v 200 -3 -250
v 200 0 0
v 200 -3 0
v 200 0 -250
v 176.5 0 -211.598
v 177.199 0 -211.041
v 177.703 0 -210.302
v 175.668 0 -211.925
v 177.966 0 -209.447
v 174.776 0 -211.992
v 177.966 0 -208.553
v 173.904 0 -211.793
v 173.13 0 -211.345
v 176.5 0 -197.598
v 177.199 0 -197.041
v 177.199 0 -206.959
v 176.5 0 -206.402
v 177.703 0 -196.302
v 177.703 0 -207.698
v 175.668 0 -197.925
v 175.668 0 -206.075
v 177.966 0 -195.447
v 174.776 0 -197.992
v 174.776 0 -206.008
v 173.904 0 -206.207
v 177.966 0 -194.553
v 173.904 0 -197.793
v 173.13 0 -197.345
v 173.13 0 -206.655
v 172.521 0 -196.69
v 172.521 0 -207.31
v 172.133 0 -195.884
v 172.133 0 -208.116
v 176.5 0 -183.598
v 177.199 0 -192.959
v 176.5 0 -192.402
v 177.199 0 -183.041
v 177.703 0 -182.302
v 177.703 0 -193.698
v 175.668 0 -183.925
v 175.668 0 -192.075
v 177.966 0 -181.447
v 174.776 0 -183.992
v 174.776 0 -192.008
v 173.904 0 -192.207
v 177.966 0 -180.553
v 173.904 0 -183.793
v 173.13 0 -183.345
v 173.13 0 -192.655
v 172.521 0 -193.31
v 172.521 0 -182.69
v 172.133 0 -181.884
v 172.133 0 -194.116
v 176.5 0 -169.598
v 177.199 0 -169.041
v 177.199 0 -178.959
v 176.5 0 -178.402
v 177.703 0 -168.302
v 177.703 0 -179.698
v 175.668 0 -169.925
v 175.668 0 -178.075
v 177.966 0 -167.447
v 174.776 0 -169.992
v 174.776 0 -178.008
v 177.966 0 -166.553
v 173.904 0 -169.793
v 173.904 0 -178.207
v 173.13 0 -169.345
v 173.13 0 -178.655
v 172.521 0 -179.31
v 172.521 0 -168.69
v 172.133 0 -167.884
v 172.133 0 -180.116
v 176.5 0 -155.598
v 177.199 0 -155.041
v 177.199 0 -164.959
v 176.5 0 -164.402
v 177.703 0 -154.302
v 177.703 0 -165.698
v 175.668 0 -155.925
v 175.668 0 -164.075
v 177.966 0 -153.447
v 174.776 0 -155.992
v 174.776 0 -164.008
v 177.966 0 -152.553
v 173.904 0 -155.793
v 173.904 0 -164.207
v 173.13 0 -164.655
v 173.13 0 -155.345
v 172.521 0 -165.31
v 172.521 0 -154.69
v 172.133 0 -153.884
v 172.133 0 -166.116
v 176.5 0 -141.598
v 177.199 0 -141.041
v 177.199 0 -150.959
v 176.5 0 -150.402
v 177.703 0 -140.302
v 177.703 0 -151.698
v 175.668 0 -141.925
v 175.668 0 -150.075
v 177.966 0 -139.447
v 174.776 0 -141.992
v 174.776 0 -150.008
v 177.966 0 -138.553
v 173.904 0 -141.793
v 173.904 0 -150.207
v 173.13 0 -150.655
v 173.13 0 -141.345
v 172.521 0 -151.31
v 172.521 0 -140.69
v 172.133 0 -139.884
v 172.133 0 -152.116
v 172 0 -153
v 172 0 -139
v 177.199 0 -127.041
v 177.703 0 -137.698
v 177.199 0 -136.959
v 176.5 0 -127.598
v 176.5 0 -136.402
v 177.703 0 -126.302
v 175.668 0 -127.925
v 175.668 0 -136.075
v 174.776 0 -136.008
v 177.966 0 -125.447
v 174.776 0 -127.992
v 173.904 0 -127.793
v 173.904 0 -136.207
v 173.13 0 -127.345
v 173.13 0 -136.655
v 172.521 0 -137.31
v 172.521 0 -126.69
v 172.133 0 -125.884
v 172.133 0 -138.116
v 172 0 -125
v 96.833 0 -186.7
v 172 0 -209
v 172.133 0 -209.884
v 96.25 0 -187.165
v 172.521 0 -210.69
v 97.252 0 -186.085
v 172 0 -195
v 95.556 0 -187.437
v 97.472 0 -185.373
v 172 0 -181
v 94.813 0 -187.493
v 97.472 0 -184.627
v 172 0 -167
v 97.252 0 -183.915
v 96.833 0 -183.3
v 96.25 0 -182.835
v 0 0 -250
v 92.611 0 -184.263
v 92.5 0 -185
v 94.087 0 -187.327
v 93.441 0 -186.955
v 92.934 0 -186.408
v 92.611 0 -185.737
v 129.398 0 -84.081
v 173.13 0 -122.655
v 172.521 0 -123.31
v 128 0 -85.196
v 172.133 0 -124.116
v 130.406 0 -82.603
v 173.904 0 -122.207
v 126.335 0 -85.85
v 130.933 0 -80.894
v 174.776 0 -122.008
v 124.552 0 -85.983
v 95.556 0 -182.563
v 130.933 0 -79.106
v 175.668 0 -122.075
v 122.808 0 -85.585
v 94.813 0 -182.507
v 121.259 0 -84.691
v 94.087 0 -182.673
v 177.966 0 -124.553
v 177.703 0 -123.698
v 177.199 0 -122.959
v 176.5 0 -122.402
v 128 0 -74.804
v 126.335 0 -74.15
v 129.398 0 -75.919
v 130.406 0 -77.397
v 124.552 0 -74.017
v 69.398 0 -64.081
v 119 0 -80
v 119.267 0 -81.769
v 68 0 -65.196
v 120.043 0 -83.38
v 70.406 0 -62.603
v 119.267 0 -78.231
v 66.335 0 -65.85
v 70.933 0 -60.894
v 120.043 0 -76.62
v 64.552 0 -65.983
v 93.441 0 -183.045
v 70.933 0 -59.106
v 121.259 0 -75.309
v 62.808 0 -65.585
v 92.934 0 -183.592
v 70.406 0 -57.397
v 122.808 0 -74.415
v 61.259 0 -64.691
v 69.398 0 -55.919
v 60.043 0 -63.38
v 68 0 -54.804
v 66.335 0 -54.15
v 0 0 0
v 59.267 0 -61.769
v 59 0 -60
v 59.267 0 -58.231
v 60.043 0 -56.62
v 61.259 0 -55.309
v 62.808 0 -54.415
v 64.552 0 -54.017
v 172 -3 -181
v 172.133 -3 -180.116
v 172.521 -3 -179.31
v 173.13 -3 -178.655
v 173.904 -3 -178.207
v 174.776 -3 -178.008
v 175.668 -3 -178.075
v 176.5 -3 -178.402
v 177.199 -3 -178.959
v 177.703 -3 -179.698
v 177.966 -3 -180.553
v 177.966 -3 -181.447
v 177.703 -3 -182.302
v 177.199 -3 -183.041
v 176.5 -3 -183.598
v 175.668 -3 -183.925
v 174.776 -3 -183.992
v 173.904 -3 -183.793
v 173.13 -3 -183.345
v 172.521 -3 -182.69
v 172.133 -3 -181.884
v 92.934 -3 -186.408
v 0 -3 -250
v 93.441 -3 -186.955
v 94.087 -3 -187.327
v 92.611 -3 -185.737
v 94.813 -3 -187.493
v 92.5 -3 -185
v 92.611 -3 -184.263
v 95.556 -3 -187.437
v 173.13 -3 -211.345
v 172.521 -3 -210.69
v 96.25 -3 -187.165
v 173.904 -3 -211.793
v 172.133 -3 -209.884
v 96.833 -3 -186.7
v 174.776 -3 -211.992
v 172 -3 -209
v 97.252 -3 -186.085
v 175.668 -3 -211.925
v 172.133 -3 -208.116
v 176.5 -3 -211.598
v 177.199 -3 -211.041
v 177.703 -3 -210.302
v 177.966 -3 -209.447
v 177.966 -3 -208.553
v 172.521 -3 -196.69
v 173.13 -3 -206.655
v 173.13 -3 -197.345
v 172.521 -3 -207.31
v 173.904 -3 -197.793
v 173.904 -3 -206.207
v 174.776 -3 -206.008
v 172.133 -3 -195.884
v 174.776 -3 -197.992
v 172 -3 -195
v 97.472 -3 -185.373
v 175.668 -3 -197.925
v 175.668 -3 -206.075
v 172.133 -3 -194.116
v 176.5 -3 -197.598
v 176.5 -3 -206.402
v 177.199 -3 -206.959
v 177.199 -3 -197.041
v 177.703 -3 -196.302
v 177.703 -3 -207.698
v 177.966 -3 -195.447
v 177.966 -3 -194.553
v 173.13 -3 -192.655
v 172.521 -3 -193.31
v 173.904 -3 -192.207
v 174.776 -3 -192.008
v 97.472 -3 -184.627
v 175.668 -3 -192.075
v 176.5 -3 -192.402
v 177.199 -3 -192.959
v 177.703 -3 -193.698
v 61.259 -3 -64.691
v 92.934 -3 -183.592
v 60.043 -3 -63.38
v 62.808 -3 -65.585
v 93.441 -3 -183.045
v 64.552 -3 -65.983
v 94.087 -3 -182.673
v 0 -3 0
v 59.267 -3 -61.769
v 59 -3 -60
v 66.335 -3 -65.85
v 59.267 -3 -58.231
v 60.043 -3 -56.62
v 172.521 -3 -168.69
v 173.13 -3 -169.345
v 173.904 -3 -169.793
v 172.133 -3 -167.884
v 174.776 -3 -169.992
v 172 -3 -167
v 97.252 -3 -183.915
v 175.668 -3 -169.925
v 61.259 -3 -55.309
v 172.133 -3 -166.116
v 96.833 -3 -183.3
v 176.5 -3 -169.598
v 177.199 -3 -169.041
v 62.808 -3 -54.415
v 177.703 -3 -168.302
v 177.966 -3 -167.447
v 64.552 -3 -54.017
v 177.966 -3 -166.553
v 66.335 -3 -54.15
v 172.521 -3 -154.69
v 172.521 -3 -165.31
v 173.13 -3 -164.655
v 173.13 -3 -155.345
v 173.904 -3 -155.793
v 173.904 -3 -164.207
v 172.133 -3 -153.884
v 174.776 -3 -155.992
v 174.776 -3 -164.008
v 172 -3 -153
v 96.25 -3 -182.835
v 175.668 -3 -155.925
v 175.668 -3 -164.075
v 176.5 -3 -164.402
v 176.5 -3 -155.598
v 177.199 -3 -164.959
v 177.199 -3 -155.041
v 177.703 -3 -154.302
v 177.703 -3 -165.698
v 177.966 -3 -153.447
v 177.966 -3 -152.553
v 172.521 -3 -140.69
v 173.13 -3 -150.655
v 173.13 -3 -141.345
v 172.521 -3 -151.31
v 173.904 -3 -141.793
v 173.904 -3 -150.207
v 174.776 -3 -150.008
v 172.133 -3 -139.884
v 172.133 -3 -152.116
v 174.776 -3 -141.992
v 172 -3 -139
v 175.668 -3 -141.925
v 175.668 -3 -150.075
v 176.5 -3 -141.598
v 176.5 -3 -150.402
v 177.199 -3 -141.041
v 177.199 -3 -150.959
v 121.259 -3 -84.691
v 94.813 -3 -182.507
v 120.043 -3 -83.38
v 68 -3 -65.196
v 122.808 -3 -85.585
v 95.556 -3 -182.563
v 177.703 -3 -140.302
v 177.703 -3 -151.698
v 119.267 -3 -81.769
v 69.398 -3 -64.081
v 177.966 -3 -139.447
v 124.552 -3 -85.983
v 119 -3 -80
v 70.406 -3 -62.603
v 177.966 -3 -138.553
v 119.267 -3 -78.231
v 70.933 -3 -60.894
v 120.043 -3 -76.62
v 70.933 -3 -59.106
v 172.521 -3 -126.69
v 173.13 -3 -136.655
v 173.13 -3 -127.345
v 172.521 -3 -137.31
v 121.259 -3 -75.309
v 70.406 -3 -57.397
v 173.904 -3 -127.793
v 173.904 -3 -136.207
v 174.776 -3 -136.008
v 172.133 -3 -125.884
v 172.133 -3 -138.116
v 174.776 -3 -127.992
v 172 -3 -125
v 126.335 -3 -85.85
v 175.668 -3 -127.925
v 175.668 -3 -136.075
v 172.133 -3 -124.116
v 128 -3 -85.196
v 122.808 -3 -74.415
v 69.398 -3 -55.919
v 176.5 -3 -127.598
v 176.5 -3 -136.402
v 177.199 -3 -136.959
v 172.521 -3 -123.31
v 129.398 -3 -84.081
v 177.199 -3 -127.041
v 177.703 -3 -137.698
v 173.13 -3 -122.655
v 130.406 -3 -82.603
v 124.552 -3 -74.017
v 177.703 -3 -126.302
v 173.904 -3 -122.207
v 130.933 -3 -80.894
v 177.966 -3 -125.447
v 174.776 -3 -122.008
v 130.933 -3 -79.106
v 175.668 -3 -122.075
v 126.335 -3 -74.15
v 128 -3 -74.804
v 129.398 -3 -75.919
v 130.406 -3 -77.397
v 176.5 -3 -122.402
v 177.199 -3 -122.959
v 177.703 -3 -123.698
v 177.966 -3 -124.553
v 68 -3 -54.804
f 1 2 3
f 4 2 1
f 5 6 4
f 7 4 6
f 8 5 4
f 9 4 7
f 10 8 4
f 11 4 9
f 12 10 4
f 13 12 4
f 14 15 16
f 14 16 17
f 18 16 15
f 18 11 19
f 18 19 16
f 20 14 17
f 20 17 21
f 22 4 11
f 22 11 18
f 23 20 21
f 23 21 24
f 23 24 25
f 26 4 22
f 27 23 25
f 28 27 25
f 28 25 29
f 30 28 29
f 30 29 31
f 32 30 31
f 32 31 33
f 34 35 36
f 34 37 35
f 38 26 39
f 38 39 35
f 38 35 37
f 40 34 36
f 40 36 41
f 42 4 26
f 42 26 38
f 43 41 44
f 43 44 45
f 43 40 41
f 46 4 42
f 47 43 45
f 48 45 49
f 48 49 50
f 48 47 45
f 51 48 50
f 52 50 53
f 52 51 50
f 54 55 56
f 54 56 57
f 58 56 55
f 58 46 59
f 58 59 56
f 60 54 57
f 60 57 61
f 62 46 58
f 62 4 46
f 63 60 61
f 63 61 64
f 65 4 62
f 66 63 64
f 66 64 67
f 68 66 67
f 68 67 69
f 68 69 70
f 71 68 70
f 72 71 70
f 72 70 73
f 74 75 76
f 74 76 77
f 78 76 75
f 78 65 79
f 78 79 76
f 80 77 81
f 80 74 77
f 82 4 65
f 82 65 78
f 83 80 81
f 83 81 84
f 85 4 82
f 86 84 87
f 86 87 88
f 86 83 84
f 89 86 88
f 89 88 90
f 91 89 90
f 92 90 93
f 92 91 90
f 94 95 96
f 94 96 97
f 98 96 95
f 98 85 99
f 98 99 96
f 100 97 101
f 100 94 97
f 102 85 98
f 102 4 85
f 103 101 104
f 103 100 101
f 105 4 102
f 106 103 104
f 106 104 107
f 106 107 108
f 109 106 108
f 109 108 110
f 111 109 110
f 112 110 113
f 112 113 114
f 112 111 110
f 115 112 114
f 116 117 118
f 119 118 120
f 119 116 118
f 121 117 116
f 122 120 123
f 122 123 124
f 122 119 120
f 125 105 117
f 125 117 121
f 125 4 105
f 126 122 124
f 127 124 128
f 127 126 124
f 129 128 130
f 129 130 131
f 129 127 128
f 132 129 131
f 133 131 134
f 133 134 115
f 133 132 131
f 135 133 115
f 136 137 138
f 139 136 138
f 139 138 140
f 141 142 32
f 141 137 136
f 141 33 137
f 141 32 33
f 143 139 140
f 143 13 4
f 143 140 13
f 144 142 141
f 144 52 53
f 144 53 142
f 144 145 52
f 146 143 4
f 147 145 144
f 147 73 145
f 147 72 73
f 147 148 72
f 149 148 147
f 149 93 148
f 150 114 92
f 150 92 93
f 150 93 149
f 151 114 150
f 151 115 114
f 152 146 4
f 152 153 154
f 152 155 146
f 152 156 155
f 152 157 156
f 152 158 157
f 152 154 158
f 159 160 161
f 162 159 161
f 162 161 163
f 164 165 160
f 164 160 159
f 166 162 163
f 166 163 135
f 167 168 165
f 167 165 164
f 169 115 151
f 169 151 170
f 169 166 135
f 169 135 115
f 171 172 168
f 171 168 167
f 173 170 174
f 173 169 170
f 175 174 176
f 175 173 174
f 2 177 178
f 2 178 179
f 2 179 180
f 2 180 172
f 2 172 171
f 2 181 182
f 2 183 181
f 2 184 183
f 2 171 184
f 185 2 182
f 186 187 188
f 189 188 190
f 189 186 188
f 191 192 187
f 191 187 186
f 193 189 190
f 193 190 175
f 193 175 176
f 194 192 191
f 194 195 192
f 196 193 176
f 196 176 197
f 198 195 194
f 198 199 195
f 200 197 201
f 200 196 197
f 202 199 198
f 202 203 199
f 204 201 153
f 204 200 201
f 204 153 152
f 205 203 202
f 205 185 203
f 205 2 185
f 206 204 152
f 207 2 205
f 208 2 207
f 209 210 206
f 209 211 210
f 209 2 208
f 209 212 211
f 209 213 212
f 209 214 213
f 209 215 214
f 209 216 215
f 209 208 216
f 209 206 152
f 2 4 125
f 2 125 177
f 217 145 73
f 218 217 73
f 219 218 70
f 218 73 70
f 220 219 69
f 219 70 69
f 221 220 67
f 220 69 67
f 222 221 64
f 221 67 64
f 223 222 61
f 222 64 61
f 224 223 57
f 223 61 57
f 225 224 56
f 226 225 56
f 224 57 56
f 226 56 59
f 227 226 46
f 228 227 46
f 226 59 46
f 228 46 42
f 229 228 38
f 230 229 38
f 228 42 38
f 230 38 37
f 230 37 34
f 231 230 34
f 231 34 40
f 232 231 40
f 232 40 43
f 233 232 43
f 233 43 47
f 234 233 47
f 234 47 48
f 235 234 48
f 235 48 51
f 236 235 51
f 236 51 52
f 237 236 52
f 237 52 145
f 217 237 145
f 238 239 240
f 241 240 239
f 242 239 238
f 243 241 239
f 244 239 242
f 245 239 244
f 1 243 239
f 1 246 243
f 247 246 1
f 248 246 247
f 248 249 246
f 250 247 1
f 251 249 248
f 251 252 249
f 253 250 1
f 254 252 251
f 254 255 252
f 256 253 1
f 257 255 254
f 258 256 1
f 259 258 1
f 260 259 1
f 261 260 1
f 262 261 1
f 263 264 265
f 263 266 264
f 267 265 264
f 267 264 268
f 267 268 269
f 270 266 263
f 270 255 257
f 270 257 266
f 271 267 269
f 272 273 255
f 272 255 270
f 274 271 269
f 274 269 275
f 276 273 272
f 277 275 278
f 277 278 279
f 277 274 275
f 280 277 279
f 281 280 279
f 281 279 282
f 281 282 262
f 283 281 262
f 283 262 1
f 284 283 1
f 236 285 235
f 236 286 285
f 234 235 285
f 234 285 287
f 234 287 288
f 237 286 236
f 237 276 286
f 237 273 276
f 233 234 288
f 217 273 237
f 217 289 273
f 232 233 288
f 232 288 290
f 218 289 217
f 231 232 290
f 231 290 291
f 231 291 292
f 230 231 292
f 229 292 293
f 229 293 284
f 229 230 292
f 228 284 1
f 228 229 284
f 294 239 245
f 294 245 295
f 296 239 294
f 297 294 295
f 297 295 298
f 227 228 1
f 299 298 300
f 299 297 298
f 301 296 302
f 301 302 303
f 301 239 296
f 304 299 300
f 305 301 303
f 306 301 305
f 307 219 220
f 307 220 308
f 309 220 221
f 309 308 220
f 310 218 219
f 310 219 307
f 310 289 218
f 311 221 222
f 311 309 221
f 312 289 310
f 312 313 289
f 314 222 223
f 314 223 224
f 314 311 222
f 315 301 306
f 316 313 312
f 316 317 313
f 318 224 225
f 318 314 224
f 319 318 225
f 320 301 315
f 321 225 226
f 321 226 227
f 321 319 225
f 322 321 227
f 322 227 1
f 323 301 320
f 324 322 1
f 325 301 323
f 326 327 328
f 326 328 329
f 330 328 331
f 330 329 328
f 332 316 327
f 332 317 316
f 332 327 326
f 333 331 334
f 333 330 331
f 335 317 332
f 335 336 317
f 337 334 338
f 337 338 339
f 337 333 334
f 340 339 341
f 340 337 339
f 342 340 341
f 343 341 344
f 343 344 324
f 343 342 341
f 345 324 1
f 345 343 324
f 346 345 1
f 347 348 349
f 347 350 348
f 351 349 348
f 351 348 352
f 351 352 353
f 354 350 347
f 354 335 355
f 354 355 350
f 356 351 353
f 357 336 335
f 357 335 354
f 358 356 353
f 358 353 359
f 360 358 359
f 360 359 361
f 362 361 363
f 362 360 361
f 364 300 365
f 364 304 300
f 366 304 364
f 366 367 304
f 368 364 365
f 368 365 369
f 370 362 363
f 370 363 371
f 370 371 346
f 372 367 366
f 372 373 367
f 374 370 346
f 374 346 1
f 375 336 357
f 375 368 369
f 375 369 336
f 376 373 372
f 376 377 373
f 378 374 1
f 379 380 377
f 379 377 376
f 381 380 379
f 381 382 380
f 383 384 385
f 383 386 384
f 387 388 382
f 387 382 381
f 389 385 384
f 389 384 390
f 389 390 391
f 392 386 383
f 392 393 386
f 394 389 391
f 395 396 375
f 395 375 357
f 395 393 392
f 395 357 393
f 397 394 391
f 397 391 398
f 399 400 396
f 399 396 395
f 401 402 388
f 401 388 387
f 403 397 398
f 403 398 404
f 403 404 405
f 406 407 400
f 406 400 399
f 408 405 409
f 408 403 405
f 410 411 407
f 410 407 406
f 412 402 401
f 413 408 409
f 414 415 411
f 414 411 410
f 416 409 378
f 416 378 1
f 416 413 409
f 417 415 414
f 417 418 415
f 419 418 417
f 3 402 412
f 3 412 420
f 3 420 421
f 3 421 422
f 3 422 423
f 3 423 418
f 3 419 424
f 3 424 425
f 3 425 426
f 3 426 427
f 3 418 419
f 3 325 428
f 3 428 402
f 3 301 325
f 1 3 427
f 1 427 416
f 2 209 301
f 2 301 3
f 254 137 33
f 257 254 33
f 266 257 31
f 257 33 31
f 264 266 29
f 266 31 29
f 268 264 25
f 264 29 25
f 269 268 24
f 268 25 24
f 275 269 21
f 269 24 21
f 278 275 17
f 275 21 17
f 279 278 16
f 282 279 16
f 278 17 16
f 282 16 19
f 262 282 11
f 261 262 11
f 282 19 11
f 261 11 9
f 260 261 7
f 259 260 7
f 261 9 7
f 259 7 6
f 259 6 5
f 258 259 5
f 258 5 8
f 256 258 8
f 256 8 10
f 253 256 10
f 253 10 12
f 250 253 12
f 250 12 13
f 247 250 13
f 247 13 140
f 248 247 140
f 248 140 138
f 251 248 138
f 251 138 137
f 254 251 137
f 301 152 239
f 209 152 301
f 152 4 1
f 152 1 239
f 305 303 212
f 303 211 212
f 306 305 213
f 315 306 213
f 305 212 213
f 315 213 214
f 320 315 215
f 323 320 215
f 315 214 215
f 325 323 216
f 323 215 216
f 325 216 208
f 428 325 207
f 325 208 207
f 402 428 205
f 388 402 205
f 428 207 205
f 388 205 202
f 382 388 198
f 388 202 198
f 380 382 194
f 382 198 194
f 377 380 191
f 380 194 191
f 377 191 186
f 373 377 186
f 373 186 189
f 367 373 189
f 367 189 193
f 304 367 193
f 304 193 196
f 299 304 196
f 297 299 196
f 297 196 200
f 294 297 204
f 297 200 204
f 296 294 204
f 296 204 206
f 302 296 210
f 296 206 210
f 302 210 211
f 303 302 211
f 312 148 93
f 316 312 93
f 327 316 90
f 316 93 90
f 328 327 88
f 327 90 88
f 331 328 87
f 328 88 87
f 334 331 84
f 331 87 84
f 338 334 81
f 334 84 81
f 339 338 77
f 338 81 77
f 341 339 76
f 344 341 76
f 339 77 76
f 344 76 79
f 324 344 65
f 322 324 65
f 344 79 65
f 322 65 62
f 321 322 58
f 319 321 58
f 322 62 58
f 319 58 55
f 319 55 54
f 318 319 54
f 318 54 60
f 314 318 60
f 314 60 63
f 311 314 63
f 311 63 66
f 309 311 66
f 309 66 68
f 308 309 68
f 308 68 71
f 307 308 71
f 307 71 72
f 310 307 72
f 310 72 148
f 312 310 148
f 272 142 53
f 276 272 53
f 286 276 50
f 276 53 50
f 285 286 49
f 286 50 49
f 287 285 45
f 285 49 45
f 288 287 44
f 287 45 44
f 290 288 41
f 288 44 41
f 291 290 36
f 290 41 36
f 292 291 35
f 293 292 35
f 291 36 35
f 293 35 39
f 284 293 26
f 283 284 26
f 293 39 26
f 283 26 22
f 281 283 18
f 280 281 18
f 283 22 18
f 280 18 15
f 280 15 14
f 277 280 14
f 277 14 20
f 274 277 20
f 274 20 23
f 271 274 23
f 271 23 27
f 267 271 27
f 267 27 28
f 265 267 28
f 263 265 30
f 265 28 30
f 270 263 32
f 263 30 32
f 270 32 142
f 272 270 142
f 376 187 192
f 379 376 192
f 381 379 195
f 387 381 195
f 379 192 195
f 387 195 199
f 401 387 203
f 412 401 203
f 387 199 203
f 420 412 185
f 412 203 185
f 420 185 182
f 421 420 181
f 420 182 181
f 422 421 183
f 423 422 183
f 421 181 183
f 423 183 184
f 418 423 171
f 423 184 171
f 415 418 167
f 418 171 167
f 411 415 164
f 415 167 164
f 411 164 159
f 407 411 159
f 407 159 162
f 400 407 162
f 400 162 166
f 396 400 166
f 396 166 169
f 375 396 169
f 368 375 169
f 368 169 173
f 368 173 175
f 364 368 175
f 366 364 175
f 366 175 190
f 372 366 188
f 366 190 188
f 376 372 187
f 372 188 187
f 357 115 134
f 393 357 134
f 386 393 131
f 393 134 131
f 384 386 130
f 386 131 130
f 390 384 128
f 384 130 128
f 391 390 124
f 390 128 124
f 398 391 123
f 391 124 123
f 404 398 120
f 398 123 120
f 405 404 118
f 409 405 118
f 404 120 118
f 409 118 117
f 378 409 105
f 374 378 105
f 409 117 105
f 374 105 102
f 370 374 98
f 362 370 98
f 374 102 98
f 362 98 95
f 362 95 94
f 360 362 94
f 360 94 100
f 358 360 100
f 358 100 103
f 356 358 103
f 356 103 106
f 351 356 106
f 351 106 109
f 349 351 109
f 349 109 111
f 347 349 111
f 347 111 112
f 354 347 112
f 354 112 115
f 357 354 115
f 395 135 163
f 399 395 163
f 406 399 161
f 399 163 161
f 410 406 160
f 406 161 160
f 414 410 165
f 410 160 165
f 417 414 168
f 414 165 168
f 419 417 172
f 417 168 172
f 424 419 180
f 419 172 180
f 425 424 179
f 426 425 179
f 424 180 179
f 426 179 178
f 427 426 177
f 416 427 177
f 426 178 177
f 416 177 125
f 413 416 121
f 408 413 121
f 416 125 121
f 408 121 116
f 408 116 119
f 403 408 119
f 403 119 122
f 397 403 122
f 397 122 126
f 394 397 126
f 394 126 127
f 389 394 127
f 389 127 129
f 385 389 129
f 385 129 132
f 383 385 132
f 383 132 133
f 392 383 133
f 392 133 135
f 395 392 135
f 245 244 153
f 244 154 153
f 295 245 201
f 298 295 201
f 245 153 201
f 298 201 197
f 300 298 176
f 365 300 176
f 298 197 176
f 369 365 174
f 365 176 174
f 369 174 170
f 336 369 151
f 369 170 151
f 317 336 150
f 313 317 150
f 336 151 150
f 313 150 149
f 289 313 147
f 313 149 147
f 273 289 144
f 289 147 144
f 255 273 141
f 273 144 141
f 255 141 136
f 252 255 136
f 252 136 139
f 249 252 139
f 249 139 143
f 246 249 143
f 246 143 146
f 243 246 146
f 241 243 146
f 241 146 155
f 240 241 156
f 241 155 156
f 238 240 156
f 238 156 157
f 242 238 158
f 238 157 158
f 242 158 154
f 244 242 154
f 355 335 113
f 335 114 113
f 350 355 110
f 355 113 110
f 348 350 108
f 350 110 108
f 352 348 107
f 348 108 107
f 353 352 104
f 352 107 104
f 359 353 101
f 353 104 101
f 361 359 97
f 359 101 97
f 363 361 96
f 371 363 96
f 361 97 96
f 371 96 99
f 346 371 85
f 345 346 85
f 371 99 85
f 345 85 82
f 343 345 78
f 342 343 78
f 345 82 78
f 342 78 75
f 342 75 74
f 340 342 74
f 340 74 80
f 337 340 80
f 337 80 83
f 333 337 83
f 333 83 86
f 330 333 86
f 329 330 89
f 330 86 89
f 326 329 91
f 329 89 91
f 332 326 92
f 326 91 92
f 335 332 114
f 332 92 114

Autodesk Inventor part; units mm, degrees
ref_plane "YZ Plane" through (0, 0, 0) normal (1, 0, 0) x (0, 1, 0)
ref_plane "XZ Plane" through (0, 0, 0) normal (0, 1, 0) x (-1, 0, 0)
ref_plane "XY Plane" through (0, 0, 0) normal (0, 0, 1) x (1, 0, 0)
sketch "block" plane through (0, 0, 0) normal (0, 1, 0) x (-1, 0, 0)
  line L0 (0, 0) -> (-200, 0)
  line L1 (-200, 0) -> (-200, -250)
  line L2 (-200, -250) -> (0, -250)
  line L3 (0, -250) -> (0, 0)
  dimension "d31" = 200
  dimension "d32" = 250
extrude "ext_block" add sketch "block" against normal blind 24
shell "Shell2" thickness 3 removed faces 0
sketch "lines_base" plane through (0, 0, 0) normal (0, 1, 0) x (-1, 0, 0)
  line L0 (0, 0) -> (-200, 0)
  line L1 (-200, 0) -> (-200, -250)
  line L2 (-200, -250) -> (0, -250)
  line L3 (0, -250) -> (0, 0)
  circle A0 centre (-65, -60) radius 6
  circle A1 centre (-125, -80) radius 6
  circle A2 centre (-65, -60) radius 12.5
  circle A3 centre (-65, -60) radius 8.5
  circle A4 centre (-125, -80) radius 8.5
  circle A5 centre (-125, -80) radius 12.5
  circle A6 centre (-175, -125) radius 3
  line L4 (-175, -125) -> (-175, -209)
  line L5 (-175, -125) -> (-91, -125) construction
  circle A7 centre (-175, -139) radius 3
  circle A8 centre (-175, -153) radius 3
  circle A9 centre (-175, -167) radius 3
  circle A10 centre (-175, -181) radius 3
  circle A11 centre (-175, -195) radius 3
  circle A12 centre (-175, -209) radius 3
  circle A13 centre (-95, -185) radius 2.5
  circle A14 centre (-95, -185) radius 5
  point P0 (-200, -125)
  dimension "d0" = 200
  dimension "d1" = 250
  dimension "d2" = 12
  dimension "d3" = 12
  dimension "d4" = 25
  dimension "d5" = 17
  dimension "d6" = 17
  dimension "d7" = 25
  dimension "d8" = 75
  dimension "d9" = 80
  dimension "d10" = 65
  dimension "d11" = 60
  dimension "d12" = 6
  dimension "d13" = 84
  dimension "d14" = 90
  dimension "d15" = 25
  dimension "d16" = 125
  dimension "d19" = 14
  dimension "d24" = 5
  dimension "d25" = 10
  dimension "d26" = 65
  dimension "d27" = 95
extrude "holes" cut sketch "lines_base" against normal up to surface (3 mm away) contours A0 | A1 | A6 | A7 L4 | L4 A7 | A8 L4 | L4 A8 | A9 L4 | L4 A9 | A10 L4 | L4 A10 | A11 L4 | L4 A11 | A12 | A13
sketch "Sketch4" plane through (200, 0, -250) normal (0, 0, -1) x (-1, 0, 0)
  line L0 (188, -4) -> (169, -4)
  line L1 (169, -4) -> (169, -17)
  line L2 (169, -17) -> (188, -17)
  line L3 (188, -17) -> (188, -4)
  line L4 (0, 0) -> (200, 0) projected
  line L5 (200, 0) -> (200, -24) projected
  dimension "d40" = 19
  dimension "d41" = 13
  dimension "d42" = 4
  dimension "d43" = 12
extrude "pwr_button_hole" cut sketch "Sketch4" against normal up to surface (3 mm away)
ref_plane "Work Plane1" through (7, -21, -243) normal (0, 1, 0) x (1, 0, 0)
sketch "Sketch5" plane through (7, -21, -243) normal (0, 1, 0) x (1, 0, 0)
  line L0 (-20.9366, 21.7948) -> (229.9216, 21.7948)
  line L1 (229.9216, 21.7948) -> (229.9216, -260.9184)
  line L2 (229.9216, -260.9184) -> (-20.9366, -260.9184)
  line L3 (-20.9366, -260.9184) -> (-20.9366, 21.7948)
  point P0 (-7, -243)
extrude "back_cover_cut" cut sketch "Sketch5" against normal through all
sketch "Sketch10" plane through (3, -3, -3) normal (0, -1, 0) x (1, 0, 0)
  line L0 (213.1188, 33.5044) -> (-22.0421, 33.5044)
  line L1 (-22.0421, 33.5044) -> (-22.0421, -278.1947)
  line L2 (-22.0421, -278.1947) -> (213.1188, -278.1947)
  line L3 (213.1188, -278.1947) -> (213.1188, 33.5044)
  point P0 (-3, 3)
extrude "Extrusion8" cut sketch "Sketch10" along normal through all
properties part number "back_top" material "Glass"
